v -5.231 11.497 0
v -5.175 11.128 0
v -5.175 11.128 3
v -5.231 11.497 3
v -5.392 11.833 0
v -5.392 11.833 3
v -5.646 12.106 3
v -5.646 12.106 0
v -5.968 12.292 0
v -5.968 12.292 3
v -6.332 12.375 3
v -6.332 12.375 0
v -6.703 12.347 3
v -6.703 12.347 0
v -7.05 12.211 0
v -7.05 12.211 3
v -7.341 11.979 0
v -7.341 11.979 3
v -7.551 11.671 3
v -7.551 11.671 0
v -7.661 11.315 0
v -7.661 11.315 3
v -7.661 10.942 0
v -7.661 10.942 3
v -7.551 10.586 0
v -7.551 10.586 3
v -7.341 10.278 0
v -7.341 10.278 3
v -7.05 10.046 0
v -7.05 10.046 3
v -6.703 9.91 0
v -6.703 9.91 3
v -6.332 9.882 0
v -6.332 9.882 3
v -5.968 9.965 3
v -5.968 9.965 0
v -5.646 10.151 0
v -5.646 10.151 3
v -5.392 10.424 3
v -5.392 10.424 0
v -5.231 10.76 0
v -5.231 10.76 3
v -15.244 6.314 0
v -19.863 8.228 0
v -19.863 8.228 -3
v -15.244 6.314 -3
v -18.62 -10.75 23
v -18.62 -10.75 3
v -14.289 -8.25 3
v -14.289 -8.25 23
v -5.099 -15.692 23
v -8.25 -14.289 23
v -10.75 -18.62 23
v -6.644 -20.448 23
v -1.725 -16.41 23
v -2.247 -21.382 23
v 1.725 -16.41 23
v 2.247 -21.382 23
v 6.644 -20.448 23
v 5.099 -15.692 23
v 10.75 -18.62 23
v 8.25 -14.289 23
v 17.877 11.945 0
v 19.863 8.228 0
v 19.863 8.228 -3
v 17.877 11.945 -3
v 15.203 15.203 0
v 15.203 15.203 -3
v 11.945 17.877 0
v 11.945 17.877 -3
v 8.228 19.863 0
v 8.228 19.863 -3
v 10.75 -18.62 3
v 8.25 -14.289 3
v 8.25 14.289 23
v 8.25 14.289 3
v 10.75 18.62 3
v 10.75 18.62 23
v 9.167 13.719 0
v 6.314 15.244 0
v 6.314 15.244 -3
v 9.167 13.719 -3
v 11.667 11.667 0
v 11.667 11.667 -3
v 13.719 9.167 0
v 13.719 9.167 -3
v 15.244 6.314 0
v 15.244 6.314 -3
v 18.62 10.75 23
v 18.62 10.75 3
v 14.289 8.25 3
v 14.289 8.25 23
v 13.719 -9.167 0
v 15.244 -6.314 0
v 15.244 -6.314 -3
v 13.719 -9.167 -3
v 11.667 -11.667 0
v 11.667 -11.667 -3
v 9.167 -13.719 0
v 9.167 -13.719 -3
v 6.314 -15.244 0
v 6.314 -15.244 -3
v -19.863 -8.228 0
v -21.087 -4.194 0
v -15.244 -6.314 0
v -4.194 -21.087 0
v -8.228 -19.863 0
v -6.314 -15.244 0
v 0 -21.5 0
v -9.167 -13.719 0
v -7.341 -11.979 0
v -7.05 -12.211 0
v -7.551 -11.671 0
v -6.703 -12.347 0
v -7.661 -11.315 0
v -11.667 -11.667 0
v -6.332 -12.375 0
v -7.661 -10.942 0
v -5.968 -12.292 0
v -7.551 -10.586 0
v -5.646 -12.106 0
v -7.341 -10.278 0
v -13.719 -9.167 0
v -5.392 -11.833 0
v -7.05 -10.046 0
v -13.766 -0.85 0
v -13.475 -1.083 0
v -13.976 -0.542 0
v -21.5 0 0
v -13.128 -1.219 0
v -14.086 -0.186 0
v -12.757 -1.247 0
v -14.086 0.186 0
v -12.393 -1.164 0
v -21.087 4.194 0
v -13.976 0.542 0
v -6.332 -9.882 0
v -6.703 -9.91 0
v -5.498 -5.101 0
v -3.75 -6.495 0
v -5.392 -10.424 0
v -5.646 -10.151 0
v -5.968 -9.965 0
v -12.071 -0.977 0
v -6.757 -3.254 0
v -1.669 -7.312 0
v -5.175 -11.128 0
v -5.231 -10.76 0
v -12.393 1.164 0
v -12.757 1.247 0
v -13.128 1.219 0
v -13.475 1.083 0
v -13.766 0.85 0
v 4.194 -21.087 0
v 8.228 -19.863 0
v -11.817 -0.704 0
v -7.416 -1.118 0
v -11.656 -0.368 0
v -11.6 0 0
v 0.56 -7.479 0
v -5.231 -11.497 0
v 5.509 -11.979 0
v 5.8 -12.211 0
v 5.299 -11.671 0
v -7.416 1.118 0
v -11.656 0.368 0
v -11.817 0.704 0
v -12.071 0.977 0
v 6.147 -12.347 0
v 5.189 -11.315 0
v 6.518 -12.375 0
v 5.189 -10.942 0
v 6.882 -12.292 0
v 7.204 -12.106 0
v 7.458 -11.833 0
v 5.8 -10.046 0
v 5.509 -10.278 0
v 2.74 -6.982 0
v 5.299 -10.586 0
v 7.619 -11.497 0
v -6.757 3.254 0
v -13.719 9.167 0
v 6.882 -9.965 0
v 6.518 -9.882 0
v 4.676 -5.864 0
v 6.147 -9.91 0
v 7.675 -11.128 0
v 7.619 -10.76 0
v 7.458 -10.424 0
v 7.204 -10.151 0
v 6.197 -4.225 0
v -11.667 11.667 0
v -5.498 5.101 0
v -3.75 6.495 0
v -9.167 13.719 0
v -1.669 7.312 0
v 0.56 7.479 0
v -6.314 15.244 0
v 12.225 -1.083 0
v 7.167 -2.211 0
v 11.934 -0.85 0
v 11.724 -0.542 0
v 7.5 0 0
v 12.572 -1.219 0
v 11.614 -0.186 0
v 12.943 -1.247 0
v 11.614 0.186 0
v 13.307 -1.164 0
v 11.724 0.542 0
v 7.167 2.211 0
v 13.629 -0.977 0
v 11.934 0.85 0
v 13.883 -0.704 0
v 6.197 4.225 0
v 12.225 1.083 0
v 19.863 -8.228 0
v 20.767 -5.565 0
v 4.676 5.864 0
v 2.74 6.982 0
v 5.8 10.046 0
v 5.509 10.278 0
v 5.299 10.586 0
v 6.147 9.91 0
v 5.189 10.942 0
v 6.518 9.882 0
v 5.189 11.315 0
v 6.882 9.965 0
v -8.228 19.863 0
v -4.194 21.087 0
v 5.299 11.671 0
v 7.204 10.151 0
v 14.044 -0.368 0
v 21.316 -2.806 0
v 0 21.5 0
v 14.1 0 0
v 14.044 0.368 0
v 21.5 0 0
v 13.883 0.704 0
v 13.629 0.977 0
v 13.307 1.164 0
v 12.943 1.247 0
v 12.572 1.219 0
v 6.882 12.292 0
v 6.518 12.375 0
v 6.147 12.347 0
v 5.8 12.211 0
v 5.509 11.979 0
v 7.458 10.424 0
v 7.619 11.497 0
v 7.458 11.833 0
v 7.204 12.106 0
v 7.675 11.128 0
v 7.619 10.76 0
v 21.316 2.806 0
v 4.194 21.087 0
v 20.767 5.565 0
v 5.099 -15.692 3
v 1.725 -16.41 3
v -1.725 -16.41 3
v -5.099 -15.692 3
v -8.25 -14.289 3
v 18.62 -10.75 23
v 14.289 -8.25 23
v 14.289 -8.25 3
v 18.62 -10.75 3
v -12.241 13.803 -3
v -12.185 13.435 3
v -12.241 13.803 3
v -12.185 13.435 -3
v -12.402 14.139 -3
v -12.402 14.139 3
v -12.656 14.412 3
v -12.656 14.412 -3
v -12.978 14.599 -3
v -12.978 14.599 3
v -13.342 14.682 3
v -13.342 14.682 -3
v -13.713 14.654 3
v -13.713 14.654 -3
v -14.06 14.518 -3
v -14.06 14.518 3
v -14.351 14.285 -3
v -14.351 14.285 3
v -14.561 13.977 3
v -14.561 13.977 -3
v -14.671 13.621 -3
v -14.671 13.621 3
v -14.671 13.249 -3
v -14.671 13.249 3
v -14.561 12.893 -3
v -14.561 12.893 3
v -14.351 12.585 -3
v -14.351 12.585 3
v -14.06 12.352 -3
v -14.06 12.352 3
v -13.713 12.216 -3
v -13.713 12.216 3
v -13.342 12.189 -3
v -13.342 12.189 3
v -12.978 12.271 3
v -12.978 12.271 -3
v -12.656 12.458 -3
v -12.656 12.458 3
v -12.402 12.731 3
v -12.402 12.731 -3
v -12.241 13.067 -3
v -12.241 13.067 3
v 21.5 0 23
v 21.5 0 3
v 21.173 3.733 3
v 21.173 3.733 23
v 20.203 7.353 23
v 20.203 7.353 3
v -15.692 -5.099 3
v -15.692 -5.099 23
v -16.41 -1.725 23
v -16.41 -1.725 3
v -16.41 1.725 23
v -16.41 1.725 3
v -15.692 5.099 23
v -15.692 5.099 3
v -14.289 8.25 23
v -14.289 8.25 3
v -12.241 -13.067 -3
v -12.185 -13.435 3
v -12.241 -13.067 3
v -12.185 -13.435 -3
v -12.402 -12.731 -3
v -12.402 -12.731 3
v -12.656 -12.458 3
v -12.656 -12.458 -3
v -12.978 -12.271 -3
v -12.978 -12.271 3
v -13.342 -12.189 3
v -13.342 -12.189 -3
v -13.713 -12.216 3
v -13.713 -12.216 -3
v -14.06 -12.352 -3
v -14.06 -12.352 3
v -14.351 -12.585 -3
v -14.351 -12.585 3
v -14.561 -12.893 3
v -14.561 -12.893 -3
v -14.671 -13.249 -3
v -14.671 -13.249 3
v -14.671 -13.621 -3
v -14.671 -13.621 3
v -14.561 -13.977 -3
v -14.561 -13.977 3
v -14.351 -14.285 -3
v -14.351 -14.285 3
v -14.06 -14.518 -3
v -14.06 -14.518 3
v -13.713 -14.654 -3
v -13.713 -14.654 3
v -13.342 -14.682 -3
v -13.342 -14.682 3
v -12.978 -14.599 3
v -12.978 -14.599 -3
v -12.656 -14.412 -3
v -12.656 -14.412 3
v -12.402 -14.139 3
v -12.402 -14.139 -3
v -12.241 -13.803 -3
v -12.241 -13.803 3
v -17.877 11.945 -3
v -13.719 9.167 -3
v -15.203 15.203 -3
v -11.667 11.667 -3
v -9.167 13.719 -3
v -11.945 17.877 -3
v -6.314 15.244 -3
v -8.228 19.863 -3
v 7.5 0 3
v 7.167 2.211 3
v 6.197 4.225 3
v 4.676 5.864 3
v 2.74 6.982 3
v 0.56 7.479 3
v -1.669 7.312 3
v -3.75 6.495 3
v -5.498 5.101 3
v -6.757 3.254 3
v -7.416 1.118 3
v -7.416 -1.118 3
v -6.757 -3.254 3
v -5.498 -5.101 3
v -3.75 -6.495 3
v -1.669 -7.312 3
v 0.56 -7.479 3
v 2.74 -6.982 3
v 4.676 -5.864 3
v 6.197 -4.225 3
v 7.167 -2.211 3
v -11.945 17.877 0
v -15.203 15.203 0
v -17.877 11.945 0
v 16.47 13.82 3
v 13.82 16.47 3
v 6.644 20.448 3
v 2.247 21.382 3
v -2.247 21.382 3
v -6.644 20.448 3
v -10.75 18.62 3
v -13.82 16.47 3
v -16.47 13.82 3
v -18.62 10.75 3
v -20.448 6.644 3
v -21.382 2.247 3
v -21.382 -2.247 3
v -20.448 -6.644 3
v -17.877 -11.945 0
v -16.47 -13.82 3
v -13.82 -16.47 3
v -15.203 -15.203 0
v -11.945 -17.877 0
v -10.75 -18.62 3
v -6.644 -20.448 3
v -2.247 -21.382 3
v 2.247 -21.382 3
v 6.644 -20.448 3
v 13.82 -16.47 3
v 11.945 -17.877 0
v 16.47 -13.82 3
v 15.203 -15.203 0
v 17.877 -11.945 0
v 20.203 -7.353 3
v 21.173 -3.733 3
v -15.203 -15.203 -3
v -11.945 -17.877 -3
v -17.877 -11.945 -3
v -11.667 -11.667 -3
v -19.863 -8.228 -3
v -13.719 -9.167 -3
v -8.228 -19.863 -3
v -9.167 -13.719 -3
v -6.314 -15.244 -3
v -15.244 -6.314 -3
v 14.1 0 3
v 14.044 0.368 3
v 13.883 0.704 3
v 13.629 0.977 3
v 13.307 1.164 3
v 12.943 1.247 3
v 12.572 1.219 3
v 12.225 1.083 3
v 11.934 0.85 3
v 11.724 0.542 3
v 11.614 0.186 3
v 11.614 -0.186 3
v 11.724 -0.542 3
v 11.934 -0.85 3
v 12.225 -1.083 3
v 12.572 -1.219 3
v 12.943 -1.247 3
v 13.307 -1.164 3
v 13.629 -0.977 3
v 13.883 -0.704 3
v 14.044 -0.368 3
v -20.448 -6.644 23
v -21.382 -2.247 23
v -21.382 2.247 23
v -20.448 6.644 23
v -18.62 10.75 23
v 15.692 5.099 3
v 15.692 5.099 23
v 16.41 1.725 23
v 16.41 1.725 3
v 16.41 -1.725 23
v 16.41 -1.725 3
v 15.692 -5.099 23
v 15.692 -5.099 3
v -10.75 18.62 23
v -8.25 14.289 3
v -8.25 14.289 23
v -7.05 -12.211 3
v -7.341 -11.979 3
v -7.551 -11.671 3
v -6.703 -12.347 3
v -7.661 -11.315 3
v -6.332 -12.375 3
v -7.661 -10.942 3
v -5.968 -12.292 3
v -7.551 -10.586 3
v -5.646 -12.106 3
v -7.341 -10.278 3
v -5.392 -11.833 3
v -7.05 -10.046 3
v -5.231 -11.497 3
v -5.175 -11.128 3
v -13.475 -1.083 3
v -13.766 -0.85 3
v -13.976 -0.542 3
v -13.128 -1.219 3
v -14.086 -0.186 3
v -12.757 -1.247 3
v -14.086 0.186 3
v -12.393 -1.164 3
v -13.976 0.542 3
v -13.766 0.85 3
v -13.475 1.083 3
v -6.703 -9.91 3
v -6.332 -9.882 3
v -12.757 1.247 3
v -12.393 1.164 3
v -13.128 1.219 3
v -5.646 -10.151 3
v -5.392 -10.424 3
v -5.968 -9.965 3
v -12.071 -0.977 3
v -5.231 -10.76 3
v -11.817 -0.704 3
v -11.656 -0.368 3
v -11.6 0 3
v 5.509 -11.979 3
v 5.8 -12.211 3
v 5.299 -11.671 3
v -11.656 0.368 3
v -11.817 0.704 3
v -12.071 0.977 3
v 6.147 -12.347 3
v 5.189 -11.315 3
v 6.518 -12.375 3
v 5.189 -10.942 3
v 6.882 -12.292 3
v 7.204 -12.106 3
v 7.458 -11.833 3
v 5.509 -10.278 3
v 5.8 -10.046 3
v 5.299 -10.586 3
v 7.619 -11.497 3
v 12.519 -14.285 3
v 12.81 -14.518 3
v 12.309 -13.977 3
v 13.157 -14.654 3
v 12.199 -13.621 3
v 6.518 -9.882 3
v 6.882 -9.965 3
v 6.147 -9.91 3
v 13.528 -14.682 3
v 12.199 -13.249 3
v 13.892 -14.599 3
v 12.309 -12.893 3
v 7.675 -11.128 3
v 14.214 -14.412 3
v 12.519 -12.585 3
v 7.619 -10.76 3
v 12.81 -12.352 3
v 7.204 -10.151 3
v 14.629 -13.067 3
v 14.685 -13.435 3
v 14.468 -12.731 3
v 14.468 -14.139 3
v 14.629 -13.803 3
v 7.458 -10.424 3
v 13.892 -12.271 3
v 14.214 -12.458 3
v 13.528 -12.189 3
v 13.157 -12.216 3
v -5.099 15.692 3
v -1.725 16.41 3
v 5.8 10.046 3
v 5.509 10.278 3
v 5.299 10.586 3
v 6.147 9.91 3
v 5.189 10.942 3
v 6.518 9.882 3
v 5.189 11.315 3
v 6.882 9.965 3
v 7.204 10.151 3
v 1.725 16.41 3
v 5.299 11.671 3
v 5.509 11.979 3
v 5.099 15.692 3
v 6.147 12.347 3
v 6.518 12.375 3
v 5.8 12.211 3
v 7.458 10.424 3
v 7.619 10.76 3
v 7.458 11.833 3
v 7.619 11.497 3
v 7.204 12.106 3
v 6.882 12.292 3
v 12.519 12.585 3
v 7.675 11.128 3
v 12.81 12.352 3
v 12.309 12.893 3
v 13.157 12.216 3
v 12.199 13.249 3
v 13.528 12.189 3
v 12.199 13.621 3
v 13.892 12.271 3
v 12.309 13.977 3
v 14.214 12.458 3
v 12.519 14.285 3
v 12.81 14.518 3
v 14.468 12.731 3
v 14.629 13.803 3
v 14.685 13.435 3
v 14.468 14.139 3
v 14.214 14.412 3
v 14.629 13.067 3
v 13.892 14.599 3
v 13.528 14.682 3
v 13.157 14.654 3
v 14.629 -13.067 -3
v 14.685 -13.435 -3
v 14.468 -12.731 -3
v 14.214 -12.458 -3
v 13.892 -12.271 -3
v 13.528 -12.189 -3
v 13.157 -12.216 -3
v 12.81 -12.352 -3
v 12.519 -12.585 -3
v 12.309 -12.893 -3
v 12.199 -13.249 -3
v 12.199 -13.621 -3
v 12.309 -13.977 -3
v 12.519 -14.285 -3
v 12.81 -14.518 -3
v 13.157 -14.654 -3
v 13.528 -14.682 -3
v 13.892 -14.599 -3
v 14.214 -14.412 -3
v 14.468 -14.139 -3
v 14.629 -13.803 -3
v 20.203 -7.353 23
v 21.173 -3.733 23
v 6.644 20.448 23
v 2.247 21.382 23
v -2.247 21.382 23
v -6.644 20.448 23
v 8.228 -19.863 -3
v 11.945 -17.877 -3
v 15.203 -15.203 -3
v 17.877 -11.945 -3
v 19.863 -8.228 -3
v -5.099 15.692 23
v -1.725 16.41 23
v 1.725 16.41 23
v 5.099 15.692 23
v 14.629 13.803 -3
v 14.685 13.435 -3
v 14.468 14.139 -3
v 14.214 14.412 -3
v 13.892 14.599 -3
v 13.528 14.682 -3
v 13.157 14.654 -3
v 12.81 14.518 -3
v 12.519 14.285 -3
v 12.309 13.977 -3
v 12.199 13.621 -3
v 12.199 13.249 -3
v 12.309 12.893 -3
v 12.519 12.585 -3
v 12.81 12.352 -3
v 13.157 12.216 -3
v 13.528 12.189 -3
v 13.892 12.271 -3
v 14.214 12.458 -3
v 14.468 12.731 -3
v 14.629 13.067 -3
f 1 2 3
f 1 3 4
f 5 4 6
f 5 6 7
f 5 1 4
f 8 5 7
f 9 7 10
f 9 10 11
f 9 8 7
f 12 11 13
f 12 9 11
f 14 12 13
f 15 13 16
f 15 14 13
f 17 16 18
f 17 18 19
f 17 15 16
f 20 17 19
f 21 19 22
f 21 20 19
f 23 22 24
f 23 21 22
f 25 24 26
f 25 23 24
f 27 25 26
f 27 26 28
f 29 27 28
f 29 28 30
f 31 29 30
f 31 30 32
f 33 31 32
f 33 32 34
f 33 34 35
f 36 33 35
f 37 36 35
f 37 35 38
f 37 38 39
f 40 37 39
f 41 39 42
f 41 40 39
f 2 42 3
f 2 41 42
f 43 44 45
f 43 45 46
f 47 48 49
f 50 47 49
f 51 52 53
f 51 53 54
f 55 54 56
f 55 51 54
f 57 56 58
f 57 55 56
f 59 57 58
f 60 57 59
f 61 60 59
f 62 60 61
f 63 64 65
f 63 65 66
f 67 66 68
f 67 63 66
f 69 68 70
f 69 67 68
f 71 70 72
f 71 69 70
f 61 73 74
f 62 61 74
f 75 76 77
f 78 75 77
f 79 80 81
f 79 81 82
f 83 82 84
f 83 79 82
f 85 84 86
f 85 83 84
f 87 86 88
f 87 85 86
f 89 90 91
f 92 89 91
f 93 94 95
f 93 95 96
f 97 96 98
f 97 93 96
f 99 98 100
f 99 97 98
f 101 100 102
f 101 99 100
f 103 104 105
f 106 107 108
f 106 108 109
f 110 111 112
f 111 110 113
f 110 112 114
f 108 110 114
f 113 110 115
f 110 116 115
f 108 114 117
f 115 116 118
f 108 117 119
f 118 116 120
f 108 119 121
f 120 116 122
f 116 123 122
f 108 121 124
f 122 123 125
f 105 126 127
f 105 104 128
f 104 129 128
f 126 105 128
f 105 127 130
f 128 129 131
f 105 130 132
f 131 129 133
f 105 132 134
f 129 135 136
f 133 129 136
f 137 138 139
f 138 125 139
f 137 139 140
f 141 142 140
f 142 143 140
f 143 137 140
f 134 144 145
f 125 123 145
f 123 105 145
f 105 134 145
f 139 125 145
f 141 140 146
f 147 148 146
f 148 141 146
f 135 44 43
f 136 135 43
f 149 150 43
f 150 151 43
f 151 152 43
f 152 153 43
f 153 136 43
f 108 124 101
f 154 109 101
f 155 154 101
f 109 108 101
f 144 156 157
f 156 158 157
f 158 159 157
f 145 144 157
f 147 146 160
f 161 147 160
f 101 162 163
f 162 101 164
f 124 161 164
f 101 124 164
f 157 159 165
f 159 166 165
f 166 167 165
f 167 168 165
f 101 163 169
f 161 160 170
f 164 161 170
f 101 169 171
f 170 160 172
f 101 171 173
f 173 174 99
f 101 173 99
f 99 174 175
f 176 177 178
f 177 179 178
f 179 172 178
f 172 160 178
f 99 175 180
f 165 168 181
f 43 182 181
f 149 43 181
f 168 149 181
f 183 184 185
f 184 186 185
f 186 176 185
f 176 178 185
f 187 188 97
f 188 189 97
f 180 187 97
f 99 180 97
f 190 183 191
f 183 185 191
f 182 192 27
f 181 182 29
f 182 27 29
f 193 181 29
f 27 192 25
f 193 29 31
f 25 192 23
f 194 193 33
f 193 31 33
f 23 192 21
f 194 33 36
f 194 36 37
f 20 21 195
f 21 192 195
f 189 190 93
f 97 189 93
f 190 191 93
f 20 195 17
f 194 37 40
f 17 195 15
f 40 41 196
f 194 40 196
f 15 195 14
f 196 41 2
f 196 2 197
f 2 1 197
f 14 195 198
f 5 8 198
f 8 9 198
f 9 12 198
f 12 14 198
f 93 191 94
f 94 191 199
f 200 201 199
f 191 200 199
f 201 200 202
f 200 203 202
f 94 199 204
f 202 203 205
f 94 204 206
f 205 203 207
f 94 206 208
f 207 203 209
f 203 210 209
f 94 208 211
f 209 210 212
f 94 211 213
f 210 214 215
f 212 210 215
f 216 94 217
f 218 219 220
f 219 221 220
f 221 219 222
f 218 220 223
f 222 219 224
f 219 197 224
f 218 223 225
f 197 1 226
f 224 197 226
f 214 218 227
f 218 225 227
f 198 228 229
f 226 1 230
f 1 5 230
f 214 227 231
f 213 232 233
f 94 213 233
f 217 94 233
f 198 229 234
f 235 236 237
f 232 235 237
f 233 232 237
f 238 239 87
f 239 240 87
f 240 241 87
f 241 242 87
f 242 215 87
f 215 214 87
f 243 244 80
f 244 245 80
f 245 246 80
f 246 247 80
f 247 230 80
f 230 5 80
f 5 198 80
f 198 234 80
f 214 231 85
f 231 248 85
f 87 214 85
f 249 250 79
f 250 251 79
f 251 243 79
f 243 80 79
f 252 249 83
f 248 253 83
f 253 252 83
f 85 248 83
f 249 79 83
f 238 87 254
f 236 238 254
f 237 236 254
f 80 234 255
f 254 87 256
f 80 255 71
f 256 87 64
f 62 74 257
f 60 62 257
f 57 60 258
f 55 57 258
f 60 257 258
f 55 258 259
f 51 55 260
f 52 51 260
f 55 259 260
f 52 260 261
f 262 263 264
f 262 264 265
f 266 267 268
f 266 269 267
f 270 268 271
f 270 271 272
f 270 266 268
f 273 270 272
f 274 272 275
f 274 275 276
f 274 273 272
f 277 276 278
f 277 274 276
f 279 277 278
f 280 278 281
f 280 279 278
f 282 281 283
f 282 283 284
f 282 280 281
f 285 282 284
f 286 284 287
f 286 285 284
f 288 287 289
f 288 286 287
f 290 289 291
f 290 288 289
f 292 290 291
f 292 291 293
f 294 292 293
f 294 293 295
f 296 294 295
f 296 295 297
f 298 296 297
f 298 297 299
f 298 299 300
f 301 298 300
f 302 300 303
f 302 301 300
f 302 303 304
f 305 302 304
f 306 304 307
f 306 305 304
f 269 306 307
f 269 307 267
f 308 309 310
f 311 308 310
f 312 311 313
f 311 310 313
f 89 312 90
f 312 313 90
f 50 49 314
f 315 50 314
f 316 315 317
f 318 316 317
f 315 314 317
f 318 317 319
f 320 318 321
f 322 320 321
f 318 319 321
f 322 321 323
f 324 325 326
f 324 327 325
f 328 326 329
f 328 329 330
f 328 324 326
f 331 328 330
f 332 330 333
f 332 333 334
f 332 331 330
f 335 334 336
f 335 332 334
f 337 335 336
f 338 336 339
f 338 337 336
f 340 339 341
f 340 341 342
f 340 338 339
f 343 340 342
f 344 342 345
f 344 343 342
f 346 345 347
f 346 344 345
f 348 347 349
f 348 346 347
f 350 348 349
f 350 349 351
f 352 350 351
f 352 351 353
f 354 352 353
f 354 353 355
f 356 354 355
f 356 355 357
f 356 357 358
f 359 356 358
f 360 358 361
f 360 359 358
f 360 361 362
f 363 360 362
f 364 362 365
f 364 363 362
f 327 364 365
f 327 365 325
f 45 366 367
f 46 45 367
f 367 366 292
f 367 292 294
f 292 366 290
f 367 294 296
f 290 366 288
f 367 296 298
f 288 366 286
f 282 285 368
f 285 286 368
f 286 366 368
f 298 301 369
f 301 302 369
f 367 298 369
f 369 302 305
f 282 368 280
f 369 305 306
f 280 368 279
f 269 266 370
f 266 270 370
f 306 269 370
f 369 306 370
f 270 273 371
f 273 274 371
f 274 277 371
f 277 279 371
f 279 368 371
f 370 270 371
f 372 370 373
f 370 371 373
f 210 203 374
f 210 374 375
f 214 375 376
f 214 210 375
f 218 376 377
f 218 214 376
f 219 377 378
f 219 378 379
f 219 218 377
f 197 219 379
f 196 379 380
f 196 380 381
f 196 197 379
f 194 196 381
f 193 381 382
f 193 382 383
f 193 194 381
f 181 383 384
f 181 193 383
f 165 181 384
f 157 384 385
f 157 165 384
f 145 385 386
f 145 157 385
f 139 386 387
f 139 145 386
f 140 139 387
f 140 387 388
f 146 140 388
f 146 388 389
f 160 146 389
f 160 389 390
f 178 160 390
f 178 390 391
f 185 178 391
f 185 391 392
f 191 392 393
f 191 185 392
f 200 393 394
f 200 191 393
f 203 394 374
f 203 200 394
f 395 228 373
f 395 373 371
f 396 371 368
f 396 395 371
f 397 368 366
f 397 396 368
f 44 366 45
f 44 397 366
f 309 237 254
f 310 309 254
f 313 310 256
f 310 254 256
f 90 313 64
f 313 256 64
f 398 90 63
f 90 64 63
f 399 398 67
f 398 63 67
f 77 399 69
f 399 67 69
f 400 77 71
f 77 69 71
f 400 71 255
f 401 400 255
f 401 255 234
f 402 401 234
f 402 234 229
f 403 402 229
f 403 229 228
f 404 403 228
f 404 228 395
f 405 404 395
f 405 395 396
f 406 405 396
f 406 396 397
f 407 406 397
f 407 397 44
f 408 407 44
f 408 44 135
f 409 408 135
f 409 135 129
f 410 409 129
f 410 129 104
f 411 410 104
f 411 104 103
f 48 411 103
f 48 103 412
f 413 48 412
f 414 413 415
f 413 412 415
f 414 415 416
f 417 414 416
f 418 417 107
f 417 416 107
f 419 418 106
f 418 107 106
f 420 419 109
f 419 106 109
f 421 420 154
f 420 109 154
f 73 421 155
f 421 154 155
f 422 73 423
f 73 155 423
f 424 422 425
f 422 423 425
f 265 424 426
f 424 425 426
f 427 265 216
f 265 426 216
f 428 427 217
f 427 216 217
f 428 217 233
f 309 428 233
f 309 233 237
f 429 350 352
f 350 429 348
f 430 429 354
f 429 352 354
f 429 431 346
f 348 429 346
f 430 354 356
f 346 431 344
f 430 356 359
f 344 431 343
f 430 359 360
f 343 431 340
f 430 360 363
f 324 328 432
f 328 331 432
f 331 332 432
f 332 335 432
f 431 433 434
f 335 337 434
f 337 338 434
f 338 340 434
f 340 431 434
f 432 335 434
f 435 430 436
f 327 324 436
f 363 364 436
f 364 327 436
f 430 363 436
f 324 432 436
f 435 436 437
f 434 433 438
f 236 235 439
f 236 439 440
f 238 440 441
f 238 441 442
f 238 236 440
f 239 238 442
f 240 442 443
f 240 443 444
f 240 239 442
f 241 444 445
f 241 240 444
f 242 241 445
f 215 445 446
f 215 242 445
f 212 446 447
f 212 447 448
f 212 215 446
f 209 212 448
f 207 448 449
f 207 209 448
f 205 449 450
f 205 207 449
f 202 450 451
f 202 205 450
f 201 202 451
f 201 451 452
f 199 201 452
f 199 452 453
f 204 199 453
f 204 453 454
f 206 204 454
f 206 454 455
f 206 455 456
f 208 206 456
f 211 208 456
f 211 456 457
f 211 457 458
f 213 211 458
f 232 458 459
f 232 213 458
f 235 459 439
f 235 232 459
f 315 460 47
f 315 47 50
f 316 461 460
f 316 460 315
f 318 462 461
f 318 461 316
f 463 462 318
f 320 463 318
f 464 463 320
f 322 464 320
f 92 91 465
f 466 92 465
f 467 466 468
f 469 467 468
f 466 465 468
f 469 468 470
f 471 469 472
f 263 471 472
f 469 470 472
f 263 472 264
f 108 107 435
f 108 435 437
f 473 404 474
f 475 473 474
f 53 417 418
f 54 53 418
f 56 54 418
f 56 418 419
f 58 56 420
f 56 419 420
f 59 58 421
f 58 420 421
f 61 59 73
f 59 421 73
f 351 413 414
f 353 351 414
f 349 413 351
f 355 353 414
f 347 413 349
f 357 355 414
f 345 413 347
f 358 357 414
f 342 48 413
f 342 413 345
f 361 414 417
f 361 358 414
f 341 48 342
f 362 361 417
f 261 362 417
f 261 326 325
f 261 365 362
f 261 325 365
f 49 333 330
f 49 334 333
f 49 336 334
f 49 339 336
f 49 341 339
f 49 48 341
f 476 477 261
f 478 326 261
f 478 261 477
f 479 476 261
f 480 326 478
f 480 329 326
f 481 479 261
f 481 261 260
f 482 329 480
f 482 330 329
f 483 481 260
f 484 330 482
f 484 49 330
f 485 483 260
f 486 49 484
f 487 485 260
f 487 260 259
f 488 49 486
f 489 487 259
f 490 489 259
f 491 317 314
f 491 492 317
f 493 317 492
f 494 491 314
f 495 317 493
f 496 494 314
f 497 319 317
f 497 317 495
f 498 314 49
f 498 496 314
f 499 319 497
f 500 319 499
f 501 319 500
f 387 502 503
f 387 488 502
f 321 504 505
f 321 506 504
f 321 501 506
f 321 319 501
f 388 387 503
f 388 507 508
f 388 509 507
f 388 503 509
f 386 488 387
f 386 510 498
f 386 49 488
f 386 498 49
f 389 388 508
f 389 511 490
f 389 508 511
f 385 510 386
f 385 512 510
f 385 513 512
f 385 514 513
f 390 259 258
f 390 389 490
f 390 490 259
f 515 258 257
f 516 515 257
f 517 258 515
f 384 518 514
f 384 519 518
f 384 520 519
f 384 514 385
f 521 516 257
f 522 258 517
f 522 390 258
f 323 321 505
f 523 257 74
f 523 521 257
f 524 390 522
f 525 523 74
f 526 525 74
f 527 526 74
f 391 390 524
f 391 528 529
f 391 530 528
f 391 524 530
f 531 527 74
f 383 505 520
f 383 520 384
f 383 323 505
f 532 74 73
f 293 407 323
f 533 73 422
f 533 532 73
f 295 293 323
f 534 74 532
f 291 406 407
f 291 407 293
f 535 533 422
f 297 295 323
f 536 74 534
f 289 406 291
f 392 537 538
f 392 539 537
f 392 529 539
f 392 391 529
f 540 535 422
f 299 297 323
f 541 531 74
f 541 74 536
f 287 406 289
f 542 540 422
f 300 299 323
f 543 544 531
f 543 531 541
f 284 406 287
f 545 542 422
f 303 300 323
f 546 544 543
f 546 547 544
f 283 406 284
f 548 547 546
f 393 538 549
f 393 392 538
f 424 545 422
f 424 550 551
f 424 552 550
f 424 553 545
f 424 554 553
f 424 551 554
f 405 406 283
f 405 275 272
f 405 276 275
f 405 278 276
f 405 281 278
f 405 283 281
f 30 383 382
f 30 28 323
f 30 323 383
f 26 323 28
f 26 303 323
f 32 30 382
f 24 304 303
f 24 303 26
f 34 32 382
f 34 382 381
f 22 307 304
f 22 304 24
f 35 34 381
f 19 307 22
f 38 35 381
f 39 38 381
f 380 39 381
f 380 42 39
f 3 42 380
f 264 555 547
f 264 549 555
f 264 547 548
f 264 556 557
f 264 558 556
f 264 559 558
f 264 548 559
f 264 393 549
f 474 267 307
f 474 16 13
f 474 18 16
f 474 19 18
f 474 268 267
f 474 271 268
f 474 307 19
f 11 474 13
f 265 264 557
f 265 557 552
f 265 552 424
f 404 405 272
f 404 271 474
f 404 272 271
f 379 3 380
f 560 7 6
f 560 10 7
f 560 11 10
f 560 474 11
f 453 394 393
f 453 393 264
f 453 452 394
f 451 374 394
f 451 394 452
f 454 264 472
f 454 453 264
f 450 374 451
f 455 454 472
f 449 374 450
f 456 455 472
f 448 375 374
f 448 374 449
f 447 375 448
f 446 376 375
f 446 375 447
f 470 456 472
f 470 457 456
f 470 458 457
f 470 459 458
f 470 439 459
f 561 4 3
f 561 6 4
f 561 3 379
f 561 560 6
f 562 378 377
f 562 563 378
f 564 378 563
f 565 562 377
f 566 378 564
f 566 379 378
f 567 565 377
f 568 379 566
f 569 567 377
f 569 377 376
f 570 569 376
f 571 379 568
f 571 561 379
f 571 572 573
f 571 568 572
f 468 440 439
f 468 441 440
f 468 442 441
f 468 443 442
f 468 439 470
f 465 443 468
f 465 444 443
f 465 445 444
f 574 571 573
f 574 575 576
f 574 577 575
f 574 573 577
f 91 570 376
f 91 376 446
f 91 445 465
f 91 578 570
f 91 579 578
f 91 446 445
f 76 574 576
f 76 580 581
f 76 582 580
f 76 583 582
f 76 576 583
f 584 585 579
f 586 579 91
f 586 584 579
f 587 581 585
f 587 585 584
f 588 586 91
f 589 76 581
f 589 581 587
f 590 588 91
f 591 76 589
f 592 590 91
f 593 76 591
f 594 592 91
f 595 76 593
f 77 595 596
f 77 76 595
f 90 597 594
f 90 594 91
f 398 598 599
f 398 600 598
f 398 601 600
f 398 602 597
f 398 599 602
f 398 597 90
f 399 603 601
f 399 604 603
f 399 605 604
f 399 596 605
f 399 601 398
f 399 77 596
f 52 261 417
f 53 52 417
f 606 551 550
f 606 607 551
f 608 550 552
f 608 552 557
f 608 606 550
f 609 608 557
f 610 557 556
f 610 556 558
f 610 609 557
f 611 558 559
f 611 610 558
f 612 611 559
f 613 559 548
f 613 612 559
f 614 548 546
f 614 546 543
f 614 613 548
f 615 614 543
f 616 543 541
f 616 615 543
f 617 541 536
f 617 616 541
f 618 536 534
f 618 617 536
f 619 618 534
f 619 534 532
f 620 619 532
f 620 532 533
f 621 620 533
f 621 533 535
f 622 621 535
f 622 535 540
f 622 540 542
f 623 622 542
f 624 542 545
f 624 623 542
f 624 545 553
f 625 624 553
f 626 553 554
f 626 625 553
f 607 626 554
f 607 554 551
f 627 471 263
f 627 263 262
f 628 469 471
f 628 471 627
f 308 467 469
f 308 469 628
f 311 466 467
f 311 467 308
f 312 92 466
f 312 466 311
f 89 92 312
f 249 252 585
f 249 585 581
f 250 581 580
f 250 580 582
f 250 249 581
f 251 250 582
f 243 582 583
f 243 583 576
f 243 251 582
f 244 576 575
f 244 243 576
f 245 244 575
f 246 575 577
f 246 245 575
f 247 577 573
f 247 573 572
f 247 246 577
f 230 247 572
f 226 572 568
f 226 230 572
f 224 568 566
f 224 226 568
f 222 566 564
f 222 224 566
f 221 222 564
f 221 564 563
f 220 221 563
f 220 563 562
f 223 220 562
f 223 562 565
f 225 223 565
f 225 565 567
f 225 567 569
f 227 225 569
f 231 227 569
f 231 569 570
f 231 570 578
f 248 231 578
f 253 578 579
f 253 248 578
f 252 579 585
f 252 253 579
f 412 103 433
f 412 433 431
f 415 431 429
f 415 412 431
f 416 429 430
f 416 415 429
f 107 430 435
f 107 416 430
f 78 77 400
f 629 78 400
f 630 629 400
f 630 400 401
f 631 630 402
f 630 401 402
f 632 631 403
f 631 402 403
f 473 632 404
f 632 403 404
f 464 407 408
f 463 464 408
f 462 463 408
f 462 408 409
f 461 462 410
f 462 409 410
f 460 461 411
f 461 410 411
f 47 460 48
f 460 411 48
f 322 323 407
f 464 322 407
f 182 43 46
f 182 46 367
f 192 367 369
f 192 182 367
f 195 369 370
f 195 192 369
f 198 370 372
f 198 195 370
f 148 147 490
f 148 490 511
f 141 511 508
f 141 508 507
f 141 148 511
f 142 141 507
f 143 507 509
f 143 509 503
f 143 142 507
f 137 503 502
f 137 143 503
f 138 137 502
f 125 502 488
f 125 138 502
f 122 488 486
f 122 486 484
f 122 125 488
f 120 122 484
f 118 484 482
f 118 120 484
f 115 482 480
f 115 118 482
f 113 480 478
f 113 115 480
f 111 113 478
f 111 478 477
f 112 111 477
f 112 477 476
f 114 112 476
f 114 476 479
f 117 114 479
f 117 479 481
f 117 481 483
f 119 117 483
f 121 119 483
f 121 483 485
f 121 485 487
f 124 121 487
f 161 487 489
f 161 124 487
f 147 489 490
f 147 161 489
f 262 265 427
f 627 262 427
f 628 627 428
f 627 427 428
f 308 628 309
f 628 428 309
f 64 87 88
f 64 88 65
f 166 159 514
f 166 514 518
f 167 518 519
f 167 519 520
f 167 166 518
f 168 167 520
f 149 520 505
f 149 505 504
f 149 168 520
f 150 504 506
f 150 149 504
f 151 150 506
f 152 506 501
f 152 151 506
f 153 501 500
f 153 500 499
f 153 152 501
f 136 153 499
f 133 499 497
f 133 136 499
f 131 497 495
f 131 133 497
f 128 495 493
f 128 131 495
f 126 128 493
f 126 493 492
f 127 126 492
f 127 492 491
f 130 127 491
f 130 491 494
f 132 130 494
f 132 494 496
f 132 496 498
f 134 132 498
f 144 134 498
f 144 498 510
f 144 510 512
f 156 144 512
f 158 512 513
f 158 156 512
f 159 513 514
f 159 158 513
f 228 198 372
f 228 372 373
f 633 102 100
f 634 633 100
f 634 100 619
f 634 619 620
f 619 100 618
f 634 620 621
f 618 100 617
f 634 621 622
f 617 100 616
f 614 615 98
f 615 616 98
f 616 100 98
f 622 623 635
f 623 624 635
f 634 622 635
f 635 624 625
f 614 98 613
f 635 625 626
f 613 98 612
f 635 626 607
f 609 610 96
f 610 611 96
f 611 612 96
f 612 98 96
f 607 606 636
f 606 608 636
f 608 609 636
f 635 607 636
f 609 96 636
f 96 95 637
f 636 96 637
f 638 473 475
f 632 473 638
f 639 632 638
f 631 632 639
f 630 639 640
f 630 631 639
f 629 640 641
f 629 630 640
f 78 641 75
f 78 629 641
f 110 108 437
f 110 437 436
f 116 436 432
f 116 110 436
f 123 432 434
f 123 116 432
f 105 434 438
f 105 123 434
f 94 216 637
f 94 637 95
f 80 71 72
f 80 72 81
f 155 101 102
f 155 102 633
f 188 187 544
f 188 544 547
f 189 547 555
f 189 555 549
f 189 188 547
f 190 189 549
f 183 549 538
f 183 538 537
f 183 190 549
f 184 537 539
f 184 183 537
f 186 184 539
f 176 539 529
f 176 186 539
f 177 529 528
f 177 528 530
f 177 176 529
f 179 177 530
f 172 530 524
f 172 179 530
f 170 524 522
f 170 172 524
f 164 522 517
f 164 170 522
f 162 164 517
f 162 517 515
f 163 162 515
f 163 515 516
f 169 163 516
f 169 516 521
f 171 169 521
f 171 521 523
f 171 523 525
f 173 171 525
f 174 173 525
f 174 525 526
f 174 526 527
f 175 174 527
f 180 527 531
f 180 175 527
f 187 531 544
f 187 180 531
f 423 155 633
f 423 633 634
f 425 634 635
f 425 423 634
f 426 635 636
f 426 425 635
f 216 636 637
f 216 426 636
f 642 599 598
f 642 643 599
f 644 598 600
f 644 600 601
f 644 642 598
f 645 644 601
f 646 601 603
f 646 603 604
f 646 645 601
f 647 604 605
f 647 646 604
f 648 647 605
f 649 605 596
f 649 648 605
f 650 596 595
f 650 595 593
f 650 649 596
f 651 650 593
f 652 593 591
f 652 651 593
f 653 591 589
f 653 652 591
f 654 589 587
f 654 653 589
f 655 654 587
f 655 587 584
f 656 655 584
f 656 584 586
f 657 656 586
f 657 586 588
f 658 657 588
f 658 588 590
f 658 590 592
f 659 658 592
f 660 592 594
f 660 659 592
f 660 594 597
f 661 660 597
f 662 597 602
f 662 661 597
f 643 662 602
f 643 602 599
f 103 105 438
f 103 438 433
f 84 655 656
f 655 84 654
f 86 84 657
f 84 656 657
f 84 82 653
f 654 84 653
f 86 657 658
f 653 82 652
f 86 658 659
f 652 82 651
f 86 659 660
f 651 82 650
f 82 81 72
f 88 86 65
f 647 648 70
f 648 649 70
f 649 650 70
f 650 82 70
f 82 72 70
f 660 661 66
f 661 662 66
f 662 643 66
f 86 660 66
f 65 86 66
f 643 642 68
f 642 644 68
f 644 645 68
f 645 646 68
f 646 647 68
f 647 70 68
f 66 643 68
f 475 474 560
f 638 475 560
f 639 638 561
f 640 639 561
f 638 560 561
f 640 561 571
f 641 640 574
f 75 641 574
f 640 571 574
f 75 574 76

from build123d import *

# Parameters (mm, degrees)
SKETCH1_R           = 21.5
SKETCH1_R_2         = 1.25
SKETCH1_R_3         = 7.5
BOSS_EXTRUDE1_DEPTH = 3
BOSS_EXTRUDE2_START = -3
SKETCH1_3_R         = 1.25
BOSS_EXTRUDE2_DEPTH = 3
BOSS_EXTRUDE6_DEPTH = 20


with BuildPart() as part:
    # Sketch1 → Boss-Extrude1 (new body)
    with BuildSketch(Plane.XY):
        Circle(SKETCH1_R)
        with Locations((-13.435028843, 13.435028843)):
            Circle(SKETCH1_R_2, mode=Mode.SUBTRACT)
        with Locations((-6.425, -11.128426439)):
            Circle(SKETCH1_R_2, mode=Mode.SUBTRACT)
        with Locations((6.425, -11.128426439)):
            Circle(SKETCH1_R_2, mode=Mode.SUBTRACT)
        with Locations((-12.85, 0)):
            Circle(SKETCH1_R_2, mode=Mode.SUBTRACT)
        with Locations((-6.425, 11.128426439)):
            Circle(SKETCH1_R_2, mode=Mode.SUBTRACT)
        Circle(SKETCH1_R_3, mode=Mode.SUBTRACT)
        with Locations((12.85, 0)):
            Circle(SKETCH1_R_2, mode=Mode.SUBTRACT)
        with Locations((6.425, 11.128426439)):
            Circle(SKETCH1_R_2, mode=Mode.SUBTRACT)
        with Locations((13.435028843, 13.435028843)):
            Circle(SKETCH1_R_2, mode=Mode.SUBTRACT)
        with Locations((13.435028843, -13.435028843)):
            Circle(SKETCH1_R_2, mode=Mode.SUBTRACT)
        with Locations((-13.435028843, -13.435028843)):
            Circle(SKETCH1_R_2, mode=Mode.SUBTRACT)
    extrude(amount=BOSS_EXTRUDE1_DEPTH)

    # Sketch1<3> → Boss-Extrude2 (add)
    # profile 1 of 4: a face of its own
    with BuildSketch(Plane.XY.offset(BOSS_EXTRUDE2_START)):
        with BuildLine():
            ThreePointArc((-15.244012286, 6.314276634), (-11.66726189, 11.66726189), (-6.314276634, 15.244012286))
            Line((-6.314276634, 15.244012286), (-8.227693796, 19.863409949))
            ThreePointArc((-8.227693796, 19.863409949), (-15.202795796, 15.202795796), (-19.863409949, 8.227693796))
            Line((-19.863409949, 8.227693796), (-15.244012286, 6.314276634))
        make_face()
        with Locations((-13.435028843, 13.435028843)):
            Circle(SKETCH1_3_R, mode=Mode.SUBTRACT)
    # profile 2 of 4: a face of its own
    with BuildSketch(Plane.XY.offset(BOSS_EXTRUDE2_START)):
        with BuildLine():
            ThreePointArc((19.863409949, 8.227693796), (15.202795796, 15.202795796), (8.227693796, 19.863409949))
            Line((8.227693796, 19.863409949), (6.314276634, 15.244012286))
            ThreePointArc((6.314276634, 15.244012286), (11.66726189, 11.66726189), (15.244012286, 6.314276634))
            Line((15.244012286, 6.314276634), (19.863409949, 8.227693796))
        make_face()
        with Locations((13.435028843, 13.435028843)):
            Circle(SKETCH1_3_R, mode=Mode.SUBTRACT)
    # profile 3 of 4: a face of its own
    with BuildSketch(Plane.XY.offset(BOSS_EXTRUDE2_START)):
        with BuildLine():
            ThreePointArc((-6.314276634, -15.244012286), (-11.66726189, -11.66726189), (-15.244012286, -6.314276634))
            Line((-15.244012286, -6.314276634), (-19.863409949, -8.227693796))
            ThreePointArc((-19.863409949, -8.227693796), (-15.202795796, -15.202795796), (-8.227693796, -19.863409949))
            Line((-8.227693796, -19.863409949), (-6.314276634, -15.244012286))
        make_face()
        with Locations((-13.435028843, -13.435028843)):
            Circle(SKETCH1_3_R, mode=Mode.SUBTRACT)
    # profile 4 of 4: a face of its own
    with BuildSketch(Plane.XY.offset(BOSS_EXTRUDE2_START)):
        with BuildLine():
            ThreePointArc((15.244012286, -6.314276634), (11.66726189, -11.66726189), (6.314276634, -15.244012286))
            Line((6.314276634, -15.244012286), (8.227693796, -19.863409949))
            ThreePointArc((8.227693796, -19.863409949), (15.202795796, -15.202795796), (19.863409949, -8.227693796))
            Line((19.863409949, -8.227693796), (15.244012286, -6.314276634))
        make_face()
        with Locations((13.435028843, -13.435028843)):
            Circle(SKETCH1_3_R, mode=Mode.SUBTRACT)
    extrude(amount=BOSS_EXTRUDE2_DEPTH)

    # Sketch7 → Boss-Extrude6 (add)
    with BuildSketch(Plane.XY.offset(3)):
        with BuildLine():
            ThreePointArc((-14.289419162, -8.25), (-16.5, 0), (-14.289419162, 8.25))
            Line((-14.289419162, 8.25), (-18.619546181, 10.75))
            ThreePointArc((-18.619546181, 10.75), (-21.5, 0), (-18.619546181, -10.75))
            Line((-18.619546181, -10.75), (-14.289419162, -8.25))
        make_face()
        with BuildLine():
            ThreePointArc((10.75, 18.619546181), (0, 21.5), (-10.75, 18.619546181))
            Line((-10.75, 18.619546181), (-8.25, 14.289419162))
            ThreePointArc((-8.25, 14.289419162), (0, 16.5), (8.25, 14.289419162))
            Line((8.25, 14.289419162), (10.75, 18.619546181))
        make_face()
        with BuildLine():
            Line((-8.25, -14.289419162), (-10.75, -18.619546181))
            ThreePointArc((-10.75, -18.619546181), (0, -21.5), (10.75, -18.619546181))
            Line((10.75, -18.619546181), (8.25, -14.289419162))
            ThreePointArc((8.25, -14.289419162), (0, -16.5), (-8.25, -14.289419162))
        make_face()
        with BuildLine():
            ThreePointArc((18.619546181, -10.75), (21.5, 0), (18.619546181, 10.75))
            Line((18.619546181, 10.75), (14.289419162, 8.25))
            ThreePointArc((14.289419162, 8.25), (16.5, 0), (14.289419162, -8.25))
            Line((14.289419162, -8.25), (18.619546181, -10.75))
        make_face()
    extrude(amount=BOSS_EXTRUDE6_DEPTH)


solid = part.part
